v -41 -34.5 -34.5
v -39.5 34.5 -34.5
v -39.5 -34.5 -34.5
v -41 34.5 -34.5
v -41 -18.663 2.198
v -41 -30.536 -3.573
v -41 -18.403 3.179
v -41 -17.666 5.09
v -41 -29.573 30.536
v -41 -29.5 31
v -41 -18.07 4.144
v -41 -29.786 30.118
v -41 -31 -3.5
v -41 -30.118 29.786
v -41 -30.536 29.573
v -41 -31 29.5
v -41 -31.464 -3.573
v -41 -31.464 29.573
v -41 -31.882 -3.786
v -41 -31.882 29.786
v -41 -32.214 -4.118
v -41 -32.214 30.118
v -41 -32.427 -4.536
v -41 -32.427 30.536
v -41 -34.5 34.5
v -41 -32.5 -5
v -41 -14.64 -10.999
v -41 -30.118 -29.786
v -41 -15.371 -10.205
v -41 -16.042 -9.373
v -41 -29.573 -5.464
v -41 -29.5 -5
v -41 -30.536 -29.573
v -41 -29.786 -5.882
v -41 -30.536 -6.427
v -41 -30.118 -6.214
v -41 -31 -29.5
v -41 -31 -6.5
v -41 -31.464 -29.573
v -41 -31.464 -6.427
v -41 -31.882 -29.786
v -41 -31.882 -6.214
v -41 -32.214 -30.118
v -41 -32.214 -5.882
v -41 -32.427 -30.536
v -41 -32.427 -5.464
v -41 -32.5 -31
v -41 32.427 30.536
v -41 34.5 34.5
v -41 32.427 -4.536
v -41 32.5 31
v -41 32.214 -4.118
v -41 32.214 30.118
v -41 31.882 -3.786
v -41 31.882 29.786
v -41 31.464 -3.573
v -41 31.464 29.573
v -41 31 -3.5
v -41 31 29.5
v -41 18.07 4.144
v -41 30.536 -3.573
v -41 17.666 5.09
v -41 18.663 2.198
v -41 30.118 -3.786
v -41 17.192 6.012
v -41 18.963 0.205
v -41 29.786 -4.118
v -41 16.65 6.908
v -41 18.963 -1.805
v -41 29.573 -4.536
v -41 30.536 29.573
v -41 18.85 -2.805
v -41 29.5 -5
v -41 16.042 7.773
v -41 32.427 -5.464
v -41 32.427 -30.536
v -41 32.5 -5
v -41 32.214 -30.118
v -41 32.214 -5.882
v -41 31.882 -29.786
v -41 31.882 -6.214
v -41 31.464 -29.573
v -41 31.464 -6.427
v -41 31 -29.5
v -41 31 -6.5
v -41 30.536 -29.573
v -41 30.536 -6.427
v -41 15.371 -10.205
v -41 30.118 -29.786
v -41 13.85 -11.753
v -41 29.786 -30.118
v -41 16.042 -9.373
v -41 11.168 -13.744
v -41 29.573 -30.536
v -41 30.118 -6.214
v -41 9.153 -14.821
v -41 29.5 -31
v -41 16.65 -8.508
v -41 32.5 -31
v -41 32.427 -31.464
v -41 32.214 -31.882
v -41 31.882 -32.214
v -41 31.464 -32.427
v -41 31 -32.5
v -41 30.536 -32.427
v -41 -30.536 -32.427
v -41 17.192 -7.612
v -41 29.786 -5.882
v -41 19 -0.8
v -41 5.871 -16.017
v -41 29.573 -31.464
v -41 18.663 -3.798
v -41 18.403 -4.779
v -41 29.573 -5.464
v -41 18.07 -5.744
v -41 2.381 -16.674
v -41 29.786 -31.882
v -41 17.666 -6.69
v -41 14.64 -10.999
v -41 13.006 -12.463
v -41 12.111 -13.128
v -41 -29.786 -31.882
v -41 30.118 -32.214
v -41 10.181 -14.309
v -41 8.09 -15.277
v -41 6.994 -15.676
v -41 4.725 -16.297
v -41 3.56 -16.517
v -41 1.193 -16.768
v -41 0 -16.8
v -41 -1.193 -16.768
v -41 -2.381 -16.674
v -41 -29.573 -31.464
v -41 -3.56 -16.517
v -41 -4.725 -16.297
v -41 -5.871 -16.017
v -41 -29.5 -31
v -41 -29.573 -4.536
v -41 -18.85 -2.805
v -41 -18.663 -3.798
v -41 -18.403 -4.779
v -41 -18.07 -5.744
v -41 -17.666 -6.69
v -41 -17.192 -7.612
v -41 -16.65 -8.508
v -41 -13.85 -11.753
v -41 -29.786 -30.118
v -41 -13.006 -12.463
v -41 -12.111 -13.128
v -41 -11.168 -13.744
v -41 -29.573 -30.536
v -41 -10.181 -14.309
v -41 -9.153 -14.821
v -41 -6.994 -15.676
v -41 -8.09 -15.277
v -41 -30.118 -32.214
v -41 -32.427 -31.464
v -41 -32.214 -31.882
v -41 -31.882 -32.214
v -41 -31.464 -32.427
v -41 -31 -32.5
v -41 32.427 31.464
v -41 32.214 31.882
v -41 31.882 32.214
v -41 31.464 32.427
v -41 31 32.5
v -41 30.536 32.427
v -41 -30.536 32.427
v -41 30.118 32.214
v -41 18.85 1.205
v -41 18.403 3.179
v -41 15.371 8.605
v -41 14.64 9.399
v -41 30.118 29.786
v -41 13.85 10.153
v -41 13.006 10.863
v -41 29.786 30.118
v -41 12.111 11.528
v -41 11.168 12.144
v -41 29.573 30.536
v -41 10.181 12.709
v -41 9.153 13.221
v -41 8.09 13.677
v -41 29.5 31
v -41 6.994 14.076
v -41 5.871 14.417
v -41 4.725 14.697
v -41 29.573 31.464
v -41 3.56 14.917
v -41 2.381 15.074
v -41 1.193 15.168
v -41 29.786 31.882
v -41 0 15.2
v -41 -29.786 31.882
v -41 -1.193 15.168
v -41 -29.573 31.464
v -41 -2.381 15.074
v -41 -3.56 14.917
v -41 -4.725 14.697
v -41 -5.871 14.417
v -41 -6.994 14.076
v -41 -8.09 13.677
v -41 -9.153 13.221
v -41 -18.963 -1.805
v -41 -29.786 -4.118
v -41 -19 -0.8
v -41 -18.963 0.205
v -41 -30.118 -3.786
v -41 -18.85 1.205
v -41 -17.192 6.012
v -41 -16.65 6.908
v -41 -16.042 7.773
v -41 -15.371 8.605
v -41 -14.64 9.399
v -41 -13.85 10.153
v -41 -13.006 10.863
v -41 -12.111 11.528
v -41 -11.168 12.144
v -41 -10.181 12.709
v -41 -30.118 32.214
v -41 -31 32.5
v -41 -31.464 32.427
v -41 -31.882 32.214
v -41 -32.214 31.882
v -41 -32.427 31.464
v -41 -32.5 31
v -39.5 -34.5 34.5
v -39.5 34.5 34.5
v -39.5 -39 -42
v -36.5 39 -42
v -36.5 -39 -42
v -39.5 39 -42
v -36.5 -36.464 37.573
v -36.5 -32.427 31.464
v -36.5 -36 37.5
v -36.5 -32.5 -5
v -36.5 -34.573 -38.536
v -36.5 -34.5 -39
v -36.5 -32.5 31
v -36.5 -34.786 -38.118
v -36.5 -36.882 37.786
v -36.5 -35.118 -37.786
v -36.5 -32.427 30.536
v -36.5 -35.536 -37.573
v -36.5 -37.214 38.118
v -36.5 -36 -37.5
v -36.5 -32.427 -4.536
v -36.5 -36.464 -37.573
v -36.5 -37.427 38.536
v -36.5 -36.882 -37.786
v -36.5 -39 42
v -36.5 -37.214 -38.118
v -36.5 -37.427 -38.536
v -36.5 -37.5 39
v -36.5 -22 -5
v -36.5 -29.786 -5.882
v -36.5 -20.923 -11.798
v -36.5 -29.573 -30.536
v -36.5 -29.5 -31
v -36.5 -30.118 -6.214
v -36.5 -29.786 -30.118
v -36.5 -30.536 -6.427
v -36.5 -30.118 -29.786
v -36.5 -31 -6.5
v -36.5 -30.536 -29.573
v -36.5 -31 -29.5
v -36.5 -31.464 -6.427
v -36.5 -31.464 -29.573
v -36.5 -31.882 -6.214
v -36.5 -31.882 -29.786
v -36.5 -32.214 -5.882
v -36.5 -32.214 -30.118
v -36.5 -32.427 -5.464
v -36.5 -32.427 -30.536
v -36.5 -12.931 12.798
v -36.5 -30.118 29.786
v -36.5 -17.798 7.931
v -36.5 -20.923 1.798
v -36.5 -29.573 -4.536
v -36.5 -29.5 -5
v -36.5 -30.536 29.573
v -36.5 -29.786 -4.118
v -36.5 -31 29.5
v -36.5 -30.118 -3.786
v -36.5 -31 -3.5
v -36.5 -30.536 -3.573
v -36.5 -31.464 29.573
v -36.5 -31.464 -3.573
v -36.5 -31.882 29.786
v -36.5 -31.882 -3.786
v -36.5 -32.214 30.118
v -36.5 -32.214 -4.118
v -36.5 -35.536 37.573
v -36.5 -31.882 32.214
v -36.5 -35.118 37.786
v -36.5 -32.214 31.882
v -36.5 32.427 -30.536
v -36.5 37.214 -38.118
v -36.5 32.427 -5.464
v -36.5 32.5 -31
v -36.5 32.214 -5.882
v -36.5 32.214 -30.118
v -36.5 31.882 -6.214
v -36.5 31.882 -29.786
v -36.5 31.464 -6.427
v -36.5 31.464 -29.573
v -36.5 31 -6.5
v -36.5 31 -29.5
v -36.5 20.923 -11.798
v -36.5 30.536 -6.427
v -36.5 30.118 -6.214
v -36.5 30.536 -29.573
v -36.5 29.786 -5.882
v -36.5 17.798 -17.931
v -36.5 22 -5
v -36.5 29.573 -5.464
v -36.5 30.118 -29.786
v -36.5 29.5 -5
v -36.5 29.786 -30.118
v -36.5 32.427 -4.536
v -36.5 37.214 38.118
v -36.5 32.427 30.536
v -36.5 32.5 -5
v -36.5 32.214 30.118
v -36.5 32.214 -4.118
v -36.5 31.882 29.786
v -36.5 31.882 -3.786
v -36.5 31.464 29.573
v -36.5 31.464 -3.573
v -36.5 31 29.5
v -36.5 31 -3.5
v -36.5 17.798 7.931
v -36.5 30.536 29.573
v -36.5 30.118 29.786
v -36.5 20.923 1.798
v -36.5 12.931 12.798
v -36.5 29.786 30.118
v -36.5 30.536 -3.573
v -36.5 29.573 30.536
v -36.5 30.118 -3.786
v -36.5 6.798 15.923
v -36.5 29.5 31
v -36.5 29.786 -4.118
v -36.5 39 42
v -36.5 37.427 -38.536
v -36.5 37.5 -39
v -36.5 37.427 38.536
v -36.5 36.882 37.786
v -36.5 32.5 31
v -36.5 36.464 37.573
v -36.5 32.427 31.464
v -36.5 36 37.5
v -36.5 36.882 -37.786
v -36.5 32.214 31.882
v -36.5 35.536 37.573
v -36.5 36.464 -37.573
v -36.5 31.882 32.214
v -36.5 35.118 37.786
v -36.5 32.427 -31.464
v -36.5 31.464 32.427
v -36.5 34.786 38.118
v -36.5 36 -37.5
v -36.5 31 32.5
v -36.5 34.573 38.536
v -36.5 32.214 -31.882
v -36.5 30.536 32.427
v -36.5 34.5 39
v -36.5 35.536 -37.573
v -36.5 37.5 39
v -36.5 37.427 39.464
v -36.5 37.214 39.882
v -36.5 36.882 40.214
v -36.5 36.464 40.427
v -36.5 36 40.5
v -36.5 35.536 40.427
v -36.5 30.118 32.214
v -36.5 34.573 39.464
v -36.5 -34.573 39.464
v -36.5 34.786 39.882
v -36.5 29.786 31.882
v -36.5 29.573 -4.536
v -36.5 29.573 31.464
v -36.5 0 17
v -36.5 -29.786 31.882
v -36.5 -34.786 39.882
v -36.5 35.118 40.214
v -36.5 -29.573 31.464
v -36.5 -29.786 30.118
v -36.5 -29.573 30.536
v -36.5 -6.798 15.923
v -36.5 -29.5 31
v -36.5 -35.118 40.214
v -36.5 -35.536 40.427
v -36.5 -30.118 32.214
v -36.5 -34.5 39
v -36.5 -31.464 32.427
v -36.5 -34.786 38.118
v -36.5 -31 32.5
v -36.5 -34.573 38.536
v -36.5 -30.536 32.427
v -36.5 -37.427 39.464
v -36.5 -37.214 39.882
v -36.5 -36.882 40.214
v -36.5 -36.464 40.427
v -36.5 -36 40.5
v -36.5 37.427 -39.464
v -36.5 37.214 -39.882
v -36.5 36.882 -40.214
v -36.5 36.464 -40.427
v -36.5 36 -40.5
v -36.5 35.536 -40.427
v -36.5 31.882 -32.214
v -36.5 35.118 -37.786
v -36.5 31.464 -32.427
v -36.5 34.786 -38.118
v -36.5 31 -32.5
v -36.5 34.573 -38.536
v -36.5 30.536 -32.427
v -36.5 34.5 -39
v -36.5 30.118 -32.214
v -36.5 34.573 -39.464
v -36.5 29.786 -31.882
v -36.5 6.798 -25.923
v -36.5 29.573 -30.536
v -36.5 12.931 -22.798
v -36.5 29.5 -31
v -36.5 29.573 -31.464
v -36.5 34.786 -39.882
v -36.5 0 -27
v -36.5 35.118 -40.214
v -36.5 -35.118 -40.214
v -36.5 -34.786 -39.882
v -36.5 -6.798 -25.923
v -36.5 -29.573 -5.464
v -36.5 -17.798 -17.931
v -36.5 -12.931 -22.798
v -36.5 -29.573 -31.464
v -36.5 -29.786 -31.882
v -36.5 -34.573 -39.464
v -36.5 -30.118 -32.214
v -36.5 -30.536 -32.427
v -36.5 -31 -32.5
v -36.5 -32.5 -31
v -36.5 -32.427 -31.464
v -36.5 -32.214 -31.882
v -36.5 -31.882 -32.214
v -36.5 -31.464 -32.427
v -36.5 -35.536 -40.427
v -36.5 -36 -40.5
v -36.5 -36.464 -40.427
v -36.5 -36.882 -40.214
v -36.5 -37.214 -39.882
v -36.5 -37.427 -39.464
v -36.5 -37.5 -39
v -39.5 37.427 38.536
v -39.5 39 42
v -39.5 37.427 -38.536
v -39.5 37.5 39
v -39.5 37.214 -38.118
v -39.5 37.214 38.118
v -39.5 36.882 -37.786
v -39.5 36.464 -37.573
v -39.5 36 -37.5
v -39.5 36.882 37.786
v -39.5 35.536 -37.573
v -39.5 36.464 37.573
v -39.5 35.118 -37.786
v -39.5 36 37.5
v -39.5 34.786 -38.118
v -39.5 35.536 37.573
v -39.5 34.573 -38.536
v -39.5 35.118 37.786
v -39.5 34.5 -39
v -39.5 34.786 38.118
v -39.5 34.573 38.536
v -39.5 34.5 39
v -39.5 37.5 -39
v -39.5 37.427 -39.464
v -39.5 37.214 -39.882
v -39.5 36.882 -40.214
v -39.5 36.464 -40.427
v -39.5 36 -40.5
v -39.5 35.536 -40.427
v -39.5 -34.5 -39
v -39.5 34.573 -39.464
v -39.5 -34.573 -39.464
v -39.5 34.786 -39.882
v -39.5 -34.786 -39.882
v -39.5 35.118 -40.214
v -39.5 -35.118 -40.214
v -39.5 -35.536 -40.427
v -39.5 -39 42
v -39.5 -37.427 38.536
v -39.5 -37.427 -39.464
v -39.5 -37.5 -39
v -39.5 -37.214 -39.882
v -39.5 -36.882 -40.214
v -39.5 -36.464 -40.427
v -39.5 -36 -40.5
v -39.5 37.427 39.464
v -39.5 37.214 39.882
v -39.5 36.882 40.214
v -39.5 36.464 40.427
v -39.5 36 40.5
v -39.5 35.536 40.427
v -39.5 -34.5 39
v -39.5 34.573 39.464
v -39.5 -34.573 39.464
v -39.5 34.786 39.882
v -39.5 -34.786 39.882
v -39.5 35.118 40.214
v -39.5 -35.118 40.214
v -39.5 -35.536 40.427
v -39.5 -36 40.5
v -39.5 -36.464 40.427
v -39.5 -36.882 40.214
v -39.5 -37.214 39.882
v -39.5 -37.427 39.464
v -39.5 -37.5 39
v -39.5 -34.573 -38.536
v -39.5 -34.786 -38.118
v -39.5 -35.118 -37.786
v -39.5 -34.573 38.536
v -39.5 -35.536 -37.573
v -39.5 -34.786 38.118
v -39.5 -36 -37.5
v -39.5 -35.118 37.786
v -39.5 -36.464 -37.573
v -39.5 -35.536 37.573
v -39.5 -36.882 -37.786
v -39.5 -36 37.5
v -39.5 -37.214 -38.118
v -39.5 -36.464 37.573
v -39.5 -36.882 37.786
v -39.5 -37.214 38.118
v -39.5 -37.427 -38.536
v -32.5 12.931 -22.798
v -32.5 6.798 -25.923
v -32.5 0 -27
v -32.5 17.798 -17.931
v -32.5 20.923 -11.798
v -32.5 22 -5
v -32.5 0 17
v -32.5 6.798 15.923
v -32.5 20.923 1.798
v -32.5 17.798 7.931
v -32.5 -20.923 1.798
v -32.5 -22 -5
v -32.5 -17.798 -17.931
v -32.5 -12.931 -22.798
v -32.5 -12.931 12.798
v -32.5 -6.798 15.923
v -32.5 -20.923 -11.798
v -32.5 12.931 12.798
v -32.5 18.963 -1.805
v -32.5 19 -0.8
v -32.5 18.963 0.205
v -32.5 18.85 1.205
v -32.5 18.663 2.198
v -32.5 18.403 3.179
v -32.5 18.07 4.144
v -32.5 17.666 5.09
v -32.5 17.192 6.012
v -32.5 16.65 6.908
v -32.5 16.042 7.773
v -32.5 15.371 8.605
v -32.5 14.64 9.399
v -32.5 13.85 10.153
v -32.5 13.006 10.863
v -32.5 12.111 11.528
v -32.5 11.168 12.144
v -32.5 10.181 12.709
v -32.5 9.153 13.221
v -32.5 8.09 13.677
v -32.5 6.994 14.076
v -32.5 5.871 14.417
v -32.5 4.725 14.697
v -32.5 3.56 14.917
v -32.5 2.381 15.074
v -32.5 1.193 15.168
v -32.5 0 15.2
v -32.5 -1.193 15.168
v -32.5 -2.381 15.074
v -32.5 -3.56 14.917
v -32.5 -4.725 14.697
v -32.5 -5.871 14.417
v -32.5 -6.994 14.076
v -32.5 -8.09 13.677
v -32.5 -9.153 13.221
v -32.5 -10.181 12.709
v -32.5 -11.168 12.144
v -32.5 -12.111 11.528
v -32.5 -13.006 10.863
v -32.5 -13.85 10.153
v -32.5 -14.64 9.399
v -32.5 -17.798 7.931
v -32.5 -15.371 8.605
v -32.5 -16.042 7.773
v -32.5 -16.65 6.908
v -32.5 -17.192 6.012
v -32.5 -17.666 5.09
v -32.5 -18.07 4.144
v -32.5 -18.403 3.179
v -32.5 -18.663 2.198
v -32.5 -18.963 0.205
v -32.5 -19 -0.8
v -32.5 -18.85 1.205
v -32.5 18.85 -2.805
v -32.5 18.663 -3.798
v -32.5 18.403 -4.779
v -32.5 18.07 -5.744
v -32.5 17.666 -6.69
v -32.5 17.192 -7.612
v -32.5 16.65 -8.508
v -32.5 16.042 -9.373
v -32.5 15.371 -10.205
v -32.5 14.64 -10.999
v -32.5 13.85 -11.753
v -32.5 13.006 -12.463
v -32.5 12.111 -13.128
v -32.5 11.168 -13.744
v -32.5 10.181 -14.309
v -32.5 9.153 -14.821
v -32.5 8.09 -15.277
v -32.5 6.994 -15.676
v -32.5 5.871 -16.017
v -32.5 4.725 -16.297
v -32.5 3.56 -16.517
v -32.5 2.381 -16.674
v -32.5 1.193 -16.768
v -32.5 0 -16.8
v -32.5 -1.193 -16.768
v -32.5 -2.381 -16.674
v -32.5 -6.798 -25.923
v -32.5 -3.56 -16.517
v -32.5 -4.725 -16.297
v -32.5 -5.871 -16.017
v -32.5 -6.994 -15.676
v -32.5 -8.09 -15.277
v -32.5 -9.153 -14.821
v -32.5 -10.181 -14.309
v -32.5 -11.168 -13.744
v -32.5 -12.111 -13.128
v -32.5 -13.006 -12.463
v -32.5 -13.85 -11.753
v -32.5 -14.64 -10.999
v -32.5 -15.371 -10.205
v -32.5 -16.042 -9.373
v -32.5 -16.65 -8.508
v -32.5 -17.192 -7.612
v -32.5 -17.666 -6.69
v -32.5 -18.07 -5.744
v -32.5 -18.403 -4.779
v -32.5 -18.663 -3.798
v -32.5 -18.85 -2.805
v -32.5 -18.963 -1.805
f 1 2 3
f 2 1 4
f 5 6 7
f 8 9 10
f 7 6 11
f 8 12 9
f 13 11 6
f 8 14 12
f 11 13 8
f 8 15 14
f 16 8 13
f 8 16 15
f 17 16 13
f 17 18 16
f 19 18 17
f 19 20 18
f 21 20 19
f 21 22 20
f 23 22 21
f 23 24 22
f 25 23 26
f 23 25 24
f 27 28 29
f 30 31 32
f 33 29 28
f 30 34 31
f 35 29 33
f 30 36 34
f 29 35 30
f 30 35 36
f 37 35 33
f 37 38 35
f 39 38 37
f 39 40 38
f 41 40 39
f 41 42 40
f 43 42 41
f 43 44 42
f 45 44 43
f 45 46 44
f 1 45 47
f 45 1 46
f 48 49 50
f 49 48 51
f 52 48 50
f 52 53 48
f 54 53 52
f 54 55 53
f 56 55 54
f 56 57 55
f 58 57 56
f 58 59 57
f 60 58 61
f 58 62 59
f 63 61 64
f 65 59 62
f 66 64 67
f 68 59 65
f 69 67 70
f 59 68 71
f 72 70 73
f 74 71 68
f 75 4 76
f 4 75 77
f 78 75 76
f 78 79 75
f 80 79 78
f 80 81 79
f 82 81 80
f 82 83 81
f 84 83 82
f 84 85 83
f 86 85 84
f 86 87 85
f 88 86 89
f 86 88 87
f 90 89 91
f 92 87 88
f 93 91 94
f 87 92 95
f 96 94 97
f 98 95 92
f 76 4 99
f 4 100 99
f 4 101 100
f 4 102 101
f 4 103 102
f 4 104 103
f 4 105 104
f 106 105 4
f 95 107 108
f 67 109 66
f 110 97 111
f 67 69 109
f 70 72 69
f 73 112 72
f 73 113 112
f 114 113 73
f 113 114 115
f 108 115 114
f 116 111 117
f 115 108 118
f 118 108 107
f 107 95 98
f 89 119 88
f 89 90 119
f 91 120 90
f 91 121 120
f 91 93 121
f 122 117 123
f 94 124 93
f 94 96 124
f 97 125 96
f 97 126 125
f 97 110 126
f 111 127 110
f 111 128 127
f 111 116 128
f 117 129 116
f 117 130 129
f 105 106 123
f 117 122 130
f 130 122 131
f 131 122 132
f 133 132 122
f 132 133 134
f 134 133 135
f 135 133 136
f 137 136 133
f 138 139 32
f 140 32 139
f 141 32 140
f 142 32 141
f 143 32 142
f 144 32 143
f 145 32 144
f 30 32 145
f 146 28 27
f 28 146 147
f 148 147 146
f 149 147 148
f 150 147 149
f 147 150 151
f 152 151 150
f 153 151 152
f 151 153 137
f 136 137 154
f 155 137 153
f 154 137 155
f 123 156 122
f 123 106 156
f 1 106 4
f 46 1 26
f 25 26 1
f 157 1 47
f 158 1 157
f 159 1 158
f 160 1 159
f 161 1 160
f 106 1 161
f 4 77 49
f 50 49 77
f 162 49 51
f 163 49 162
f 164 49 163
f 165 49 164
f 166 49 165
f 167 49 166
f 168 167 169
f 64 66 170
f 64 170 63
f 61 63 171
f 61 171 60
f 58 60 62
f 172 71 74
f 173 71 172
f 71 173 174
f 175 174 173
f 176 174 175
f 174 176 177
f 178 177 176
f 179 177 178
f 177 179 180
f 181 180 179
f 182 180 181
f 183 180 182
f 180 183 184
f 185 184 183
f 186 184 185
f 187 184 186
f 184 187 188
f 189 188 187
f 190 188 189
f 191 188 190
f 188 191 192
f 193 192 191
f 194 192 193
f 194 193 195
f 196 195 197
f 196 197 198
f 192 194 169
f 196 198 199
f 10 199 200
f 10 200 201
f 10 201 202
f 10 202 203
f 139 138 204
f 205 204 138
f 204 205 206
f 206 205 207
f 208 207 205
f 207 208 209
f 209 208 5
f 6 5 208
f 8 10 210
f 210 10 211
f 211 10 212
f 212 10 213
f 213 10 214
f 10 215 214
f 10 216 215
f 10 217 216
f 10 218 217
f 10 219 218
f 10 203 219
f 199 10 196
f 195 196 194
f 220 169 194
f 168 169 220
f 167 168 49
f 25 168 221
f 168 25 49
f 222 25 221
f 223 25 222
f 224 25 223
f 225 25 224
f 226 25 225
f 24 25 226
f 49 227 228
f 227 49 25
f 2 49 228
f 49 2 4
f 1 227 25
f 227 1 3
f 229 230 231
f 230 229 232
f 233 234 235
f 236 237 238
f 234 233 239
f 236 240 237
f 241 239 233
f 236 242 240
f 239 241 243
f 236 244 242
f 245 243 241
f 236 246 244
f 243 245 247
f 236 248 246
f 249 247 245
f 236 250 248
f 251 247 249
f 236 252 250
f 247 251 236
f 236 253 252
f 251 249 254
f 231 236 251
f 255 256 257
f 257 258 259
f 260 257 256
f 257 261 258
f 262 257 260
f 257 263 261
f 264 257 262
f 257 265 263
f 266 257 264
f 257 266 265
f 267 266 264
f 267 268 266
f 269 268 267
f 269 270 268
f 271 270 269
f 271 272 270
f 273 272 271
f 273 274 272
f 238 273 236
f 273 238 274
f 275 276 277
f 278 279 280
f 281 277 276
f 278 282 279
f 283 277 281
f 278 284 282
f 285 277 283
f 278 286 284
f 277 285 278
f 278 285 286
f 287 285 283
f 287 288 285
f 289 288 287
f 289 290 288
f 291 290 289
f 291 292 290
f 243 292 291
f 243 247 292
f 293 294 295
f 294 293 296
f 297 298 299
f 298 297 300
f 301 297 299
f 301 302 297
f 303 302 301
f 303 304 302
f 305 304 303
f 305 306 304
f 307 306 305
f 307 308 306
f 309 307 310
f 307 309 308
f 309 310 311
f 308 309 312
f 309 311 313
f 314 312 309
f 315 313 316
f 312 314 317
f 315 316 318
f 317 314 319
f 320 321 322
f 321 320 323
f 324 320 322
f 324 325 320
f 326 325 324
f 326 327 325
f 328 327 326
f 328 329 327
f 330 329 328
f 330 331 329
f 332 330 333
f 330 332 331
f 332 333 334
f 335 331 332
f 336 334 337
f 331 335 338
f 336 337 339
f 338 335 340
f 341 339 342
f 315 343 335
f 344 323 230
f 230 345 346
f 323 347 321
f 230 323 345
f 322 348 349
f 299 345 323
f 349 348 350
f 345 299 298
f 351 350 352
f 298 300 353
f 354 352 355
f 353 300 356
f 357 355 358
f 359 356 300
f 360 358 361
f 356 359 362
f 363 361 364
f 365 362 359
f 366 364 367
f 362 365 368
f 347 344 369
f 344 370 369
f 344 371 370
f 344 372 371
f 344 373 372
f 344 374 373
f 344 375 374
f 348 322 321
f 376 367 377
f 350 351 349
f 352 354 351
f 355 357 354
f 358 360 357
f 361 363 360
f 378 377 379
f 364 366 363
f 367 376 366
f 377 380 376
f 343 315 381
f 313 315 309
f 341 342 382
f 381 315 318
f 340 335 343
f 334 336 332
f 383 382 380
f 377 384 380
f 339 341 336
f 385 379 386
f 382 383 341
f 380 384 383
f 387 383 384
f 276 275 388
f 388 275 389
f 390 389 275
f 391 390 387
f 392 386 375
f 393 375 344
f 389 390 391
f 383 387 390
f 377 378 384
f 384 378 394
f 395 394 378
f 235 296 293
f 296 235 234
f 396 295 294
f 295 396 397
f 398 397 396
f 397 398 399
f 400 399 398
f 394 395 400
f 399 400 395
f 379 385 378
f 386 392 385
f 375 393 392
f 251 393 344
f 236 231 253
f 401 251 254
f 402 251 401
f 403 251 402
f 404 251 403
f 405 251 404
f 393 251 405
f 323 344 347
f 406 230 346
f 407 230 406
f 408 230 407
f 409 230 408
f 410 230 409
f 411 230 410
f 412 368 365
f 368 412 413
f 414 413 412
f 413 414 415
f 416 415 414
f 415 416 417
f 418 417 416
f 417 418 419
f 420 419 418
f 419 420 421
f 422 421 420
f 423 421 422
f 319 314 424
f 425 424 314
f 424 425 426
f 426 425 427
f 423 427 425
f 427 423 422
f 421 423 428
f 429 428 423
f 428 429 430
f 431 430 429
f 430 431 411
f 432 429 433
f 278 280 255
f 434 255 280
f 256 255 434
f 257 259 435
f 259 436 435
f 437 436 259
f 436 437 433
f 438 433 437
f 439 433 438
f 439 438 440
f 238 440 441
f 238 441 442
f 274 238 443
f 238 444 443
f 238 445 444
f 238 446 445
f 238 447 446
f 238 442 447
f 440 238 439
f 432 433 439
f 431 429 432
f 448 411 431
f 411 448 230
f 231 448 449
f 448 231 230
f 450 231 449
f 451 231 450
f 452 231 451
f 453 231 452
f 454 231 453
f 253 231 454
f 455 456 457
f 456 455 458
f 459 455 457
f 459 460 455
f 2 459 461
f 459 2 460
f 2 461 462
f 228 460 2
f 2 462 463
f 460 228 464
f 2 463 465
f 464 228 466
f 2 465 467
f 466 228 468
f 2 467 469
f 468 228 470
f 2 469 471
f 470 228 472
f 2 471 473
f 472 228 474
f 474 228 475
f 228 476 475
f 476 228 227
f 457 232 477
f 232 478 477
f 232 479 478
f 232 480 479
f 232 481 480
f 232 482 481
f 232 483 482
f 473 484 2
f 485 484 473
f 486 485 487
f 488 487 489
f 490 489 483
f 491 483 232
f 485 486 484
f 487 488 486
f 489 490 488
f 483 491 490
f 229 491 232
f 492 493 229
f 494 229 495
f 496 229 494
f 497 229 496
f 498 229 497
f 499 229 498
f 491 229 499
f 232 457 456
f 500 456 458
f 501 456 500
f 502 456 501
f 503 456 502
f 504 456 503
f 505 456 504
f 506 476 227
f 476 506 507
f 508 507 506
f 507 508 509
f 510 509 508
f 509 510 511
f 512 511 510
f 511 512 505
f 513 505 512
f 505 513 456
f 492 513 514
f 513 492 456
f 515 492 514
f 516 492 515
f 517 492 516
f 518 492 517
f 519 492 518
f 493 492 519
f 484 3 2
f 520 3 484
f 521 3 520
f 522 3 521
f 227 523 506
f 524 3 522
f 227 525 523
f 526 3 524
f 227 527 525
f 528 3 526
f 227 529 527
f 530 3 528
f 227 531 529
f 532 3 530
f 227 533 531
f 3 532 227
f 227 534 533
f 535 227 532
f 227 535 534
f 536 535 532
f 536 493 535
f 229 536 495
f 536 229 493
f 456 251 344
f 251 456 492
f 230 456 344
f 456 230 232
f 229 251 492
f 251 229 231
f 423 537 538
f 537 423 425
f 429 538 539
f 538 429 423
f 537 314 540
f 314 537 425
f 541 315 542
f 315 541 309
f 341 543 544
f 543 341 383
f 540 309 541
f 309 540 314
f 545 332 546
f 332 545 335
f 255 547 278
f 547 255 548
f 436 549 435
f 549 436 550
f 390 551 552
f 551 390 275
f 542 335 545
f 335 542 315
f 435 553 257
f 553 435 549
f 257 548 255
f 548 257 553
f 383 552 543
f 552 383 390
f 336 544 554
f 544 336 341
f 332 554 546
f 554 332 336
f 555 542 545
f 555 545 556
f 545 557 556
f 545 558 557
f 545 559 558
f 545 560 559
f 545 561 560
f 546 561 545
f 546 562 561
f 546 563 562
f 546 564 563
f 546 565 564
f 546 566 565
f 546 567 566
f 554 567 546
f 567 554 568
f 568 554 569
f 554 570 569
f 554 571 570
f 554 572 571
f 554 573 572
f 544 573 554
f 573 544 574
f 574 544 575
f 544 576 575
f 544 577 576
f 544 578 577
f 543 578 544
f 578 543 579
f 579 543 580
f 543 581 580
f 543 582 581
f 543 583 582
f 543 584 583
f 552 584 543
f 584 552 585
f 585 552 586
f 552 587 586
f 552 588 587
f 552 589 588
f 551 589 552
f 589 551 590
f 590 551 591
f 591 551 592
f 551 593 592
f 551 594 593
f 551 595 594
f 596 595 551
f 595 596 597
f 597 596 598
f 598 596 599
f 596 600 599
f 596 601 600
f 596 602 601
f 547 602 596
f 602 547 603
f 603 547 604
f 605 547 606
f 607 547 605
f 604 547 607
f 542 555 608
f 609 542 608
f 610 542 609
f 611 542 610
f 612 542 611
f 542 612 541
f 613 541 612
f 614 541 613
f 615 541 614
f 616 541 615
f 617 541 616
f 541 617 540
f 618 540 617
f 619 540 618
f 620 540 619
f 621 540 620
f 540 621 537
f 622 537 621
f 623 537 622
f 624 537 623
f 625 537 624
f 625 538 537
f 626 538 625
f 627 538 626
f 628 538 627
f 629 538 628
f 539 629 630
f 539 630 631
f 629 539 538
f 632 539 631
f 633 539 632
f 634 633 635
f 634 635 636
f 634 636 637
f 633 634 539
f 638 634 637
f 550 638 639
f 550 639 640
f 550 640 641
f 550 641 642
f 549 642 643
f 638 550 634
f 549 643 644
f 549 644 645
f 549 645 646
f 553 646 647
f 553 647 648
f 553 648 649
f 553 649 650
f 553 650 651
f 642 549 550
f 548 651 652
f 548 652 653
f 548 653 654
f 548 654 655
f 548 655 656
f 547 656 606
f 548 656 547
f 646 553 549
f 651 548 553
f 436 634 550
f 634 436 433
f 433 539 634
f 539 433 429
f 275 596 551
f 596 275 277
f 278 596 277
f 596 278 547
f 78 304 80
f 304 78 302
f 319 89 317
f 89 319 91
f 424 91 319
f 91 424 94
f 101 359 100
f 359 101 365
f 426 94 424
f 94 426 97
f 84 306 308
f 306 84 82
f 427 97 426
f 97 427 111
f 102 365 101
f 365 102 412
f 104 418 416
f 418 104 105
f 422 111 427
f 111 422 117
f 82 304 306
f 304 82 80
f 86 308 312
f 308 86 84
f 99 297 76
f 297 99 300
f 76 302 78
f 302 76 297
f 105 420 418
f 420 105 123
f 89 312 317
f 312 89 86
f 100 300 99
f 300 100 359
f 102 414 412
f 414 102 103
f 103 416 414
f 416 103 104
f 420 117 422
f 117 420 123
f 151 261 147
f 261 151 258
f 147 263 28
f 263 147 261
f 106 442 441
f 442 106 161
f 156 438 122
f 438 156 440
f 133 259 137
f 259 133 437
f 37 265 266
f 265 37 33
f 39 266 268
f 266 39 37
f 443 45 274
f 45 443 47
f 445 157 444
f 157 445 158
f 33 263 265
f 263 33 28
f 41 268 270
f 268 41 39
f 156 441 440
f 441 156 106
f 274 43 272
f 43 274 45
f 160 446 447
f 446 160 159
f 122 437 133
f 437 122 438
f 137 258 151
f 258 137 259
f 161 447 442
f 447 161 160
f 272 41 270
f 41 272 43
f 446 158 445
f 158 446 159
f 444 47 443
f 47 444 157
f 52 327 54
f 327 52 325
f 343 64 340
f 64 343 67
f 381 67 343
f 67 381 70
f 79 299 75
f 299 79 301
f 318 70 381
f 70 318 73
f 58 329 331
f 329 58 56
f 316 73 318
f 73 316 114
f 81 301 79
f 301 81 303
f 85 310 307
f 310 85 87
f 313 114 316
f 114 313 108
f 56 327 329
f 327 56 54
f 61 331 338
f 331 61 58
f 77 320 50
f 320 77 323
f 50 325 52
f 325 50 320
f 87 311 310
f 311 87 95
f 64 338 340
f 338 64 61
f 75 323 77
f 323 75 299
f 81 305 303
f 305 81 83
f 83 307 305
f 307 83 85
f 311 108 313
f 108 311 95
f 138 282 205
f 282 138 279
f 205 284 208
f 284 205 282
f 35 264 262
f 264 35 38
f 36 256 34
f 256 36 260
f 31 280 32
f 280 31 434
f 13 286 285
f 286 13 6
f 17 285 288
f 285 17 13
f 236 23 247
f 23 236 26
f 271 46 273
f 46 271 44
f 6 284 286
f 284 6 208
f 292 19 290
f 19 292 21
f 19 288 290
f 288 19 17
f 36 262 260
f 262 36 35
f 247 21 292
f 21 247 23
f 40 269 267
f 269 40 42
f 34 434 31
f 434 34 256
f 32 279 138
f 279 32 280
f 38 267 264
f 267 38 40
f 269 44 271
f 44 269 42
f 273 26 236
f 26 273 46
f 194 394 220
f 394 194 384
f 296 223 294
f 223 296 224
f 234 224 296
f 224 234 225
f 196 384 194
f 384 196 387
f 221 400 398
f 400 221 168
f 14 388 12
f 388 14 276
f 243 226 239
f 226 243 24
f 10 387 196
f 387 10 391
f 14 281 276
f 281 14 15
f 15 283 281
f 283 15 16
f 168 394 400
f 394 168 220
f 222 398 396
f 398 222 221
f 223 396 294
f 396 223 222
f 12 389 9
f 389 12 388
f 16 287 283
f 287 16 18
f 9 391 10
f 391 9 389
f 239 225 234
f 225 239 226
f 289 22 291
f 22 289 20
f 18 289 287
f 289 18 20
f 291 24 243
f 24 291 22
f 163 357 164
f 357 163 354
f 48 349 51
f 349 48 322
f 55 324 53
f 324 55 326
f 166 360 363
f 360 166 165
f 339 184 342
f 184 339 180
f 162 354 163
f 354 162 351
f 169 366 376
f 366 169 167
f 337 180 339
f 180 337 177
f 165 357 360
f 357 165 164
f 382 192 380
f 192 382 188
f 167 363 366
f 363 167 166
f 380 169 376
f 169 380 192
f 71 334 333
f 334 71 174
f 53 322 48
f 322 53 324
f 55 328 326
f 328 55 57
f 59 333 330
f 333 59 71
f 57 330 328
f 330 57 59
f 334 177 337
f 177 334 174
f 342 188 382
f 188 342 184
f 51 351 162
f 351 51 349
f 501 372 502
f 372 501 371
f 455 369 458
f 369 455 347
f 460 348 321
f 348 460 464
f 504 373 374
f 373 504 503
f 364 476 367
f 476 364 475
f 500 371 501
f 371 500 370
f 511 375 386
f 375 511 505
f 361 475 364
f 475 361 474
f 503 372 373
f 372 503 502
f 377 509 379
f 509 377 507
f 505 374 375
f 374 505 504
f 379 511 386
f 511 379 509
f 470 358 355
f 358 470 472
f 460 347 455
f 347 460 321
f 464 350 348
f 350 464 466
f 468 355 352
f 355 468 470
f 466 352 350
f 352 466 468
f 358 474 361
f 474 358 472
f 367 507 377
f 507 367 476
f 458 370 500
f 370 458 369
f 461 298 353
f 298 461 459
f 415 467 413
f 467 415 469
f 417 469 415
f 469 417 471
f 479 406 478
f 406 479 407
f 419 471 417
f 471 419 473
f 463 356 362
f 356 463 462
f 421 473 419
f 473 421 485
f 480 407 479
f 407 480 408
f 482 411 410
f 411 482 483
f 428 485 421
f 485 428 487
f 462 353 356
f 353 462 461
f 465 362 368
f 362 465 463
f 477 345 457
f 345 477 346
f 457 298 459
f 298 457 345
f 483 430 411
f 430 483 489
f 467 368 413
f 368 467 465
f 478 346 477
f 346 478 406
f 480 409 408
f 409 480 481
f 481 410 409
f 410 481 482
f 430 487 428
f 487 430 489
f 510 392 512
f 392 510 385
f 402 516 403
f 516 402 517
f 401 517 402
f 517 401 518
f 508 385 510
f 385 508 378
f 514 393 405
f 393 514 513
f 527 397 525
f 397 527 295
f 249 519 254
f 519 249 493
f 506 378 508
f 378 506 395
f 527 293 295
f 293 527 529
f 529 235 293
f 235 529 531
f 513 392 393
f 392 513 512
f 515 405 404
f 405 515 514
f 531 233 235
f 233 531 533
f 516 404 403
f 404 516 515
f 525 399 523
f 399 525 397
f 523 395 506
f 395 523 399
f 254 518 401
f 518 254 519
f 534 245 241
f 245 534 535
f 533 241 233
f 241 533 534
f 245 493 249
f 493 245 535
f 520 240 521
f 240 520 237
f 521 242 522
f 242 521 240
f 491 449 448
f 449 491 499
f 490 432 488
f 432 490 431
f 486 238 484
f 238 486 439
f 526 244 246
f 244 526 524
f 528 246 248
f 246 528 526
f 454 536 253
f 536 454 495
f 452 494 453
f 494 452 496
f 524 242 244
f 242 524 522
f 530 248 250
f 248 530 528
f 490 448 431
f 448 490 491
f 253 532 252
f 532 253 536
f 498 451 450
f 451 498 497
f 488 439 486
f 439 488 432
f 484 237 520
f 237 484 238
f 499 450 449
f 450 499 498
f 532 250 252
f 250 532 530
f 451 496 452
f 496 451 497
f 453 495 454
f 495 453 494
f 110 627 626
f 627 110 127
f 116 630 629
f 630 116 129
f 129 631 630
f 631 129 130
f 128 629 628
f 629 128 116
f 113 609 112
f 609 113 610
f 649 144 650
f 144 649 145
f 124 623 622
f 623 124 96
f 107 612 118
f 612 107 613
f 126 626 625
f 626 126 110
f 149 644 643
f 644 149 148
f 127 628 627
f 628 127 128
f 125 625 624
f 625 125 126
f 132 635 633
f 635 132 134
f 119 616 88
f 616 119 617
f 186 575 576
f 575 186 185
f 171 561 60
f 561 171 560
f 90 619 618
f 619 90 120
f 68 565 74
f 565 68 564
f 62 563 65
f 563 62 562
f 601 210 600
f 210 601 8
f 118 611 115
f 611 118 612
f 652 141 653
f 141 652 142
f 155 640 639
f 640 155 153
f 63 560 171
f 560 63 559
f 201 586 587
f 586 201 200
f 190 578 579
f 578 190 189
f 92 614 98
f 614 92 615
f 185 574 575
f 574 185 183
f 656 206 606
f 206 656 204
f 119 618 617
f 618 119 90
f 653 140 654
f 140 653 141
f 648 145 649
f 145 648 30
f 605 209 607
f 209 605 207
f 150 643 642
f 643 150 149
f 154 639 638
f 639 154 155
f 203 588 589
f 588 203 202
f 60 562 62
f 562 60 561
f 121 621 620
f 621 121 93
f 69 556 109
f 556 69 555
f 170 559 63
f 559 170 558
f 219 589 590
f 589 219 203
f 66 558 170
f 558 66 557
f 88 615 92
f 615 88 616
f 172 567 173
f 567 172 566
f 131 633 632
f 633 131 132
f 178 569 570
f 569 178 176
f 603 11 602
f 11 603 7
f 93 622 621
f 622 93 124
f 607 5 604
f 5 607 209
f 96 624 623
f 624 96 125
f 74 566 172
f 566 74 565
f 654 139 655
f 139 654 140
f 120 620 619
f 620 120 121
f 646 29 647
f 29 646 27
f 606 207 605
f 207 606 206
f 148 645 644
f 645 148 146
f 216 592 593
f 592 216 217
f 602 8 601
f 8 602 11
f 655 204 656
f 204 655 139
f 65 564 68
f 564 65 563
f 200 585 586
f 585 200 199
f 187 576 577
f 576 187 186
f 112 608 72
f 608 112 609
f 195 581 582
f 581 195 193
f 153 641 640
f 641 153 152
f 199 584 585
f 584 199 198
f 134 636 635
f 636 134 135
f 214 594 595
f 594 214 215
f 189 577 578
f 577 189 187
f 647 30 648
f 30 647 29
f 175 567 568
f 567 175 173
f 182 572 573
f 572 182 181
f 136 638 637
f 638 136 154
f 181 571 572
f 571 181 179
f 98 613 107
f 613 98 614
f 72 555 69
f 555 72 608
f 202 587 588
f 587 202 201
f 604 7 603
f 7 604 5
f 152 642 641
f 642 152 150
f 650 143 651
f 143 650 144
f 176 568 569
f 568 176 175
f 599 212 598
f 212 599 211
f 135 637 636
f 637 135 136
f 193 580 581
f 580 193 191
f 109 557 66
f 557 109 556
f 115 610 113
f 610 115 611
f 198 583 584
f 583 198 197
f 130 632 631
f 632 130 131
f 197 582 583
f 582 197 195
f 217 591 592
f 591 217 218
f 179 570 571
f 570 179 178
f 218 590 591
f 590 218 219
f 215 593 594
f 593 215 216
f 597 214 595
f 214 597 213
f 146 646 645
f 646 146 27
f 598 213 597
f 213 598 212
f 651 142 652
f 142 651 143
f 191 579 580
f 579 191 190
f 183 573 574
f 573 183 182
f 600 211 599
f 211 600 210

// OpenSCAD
$fn=20;

module screw(){
	translate([-30,0,0])rotate([0,90,0]) cylinder(r=1.50, h=35,center=true);
}

module screwset(){
	dist=31;
  	translate([0,dist,dist])screw();
    translate([0,-dist,dist])screw();
	translate([0,dist,0])screw();
	translate([0,-dist,0])screw();
  	translate([0,-dist,-dist])screw();
  	translate([0,dist,-dist])screw();

}


module screwset_frontpanel(){
	dist=31;
  	translate([0,dist,dist])screw();
        translate([0,-dist,dist])screw();
	translate([0,dist,5])screw();
	translate([0,-dist,5])screw();
  	translate([0,-dist,-dist])screw();
  	translate([0,dist,-dist])screw();
    translate([0,36,-39])screw();
    translate([0,36,39])screw();
    translate([0,-36,-39])screw();
    translate([0,-36,39])screw();

}


dia=23; // of the antenna

module antenna_cover(){
	difference(){
		union(){
			cylinder(r=dia+4,h=6,center=true);
			cube([6,dia*2+22,6],center=true);
		}
		translate([0,0,-1])cylinder(r=dia+2,h=5,center=true);
		cylinder(r=dia-2,h=7,center=true);
		translate([0,0,30])rotate([0,-90,0])screwset();
        translate([5,0,-2])cube([2,80,2],center=true);
	}
}

module rfid_board_hook(){
	distance=25;
    stickout=36;
    x=23;
	translate([x,stickout,distance]) cube([3,4,4],center=true);
	translate([x,stickout,-distance]) cube([3,4,4],center=true);
	translate([x,-stickout,distance]) cube([3,4,5],center=true);
	translate([x,-stickout,-distance]) cube([3,4,5],center=true);
}


module cboard_cover(){
//	translate([5,0,0])
        difference(){
		union(){
			translate([15,43,0])cube([30,12,63],center=true);
			translate([15,37,0])cube([30,4,70],center=true);
		}
		translate([15,40,0])cube([26,10,58],center=true);
		translate([18,38,0])cube([26,7,10],center=true);
		translate([15,35,0])cboard_screw(dia=2);
	}
}

module spoutholder(){
    rfid_board_hook();
	difference(){
        union(){
            cube([60,70,70],center=true); //outside
            translate([13,0,28])rotate([0,35,0])cube([20,30,30],center=true); // plate for spout
        }
		translate([-14,0,0])screwset();
		translate([-14,0,0])rotate([0,90,0])cylinder(r=dia-3,h=35,center=true);//rfid ring
		translate([-20,0,0])cube([55,60,56],center=true); //front chamber
		translate([20.1,0,-15])cube([20,50,80],center=true); //back chamber
		translate([-25,0,0])cube([10,80,56],center=true);//side slot
		translate([-12,11,-29])rotate([4,0,0])cube([40,27,6.2],center=true);//bottom
		translate([-12,-11,-29])rotate([-4,0,0])cube([40,27,6.2],center=true);//bottom
	        translate([-14,0,5])rotate([0,0,90])union(){  // spout assembly
		translate([0,-10,0]) rotate([0,90,0]) cylinder(r=2.5, h=75,center=true); //holes for alignment of the spout tip 			
		translate([0,-10,0]) rotate([35,0,0]) cylinder(r=4.6, h=55); // location of the spout 
		translate([0,-42,31]) rotate([-55, 0,0]) cube([8.4, 18, 4.1], center=true);// hex screw for spout 
		translate([0,-60,14]) rotate([-55,0,0]) cylinder(r=1.9, h=50); //screw hole for tightening the spout 
		translate([0,-10,-60]) cylinder(r=5, h=40); //hole for collection tube //yes
		}
		translate([15,35,0])cboard_screw();
		translate([0,0,30])cylinder(r=2.8,h=20,center=true);//cue light
		translate([-8,0,30])cylinder(r=2.8,h=20,center=true);//cue light
	}
}

module cboard_screw(dia=1.5){
	distance=32;
	translate([0,0,distance])rotate([90,0,0]) cylinder(r=dia, h=350,center=true);
	translate([0,0,-distance])rotate([90,0,0]) cylinder(r=dia, h=350,center=true);
	translate([0,19,-distance])rotate([90,0,0]) cylinder(r=dia+3, h=30,center=true); // screw head
	translate([0,19,distance])rotate([90,0,0]) cylinder(r=dia+3, h=30,center=true); // screw head
}

module frontpanel(){
    difference(){
        union(){
            cube([69,69,2],center=true);
            translate([0,0,2])cube([84,78,3],center=true);
            translate([5,0,5])cylinder(r=dia-1,h=5,center=true);
        }
    	scale([.8,.95,1])translate([1,0,4])cylinder(r=dia-3,h=14,center=true,$fn=100);
        translate([0,0,-20])rotate([0,90,0])screwset_frontpanel();
    }
}


translate([-40,0,0])rotate([0,90,0])frontpanel();
//color("red")translate([-35,0,-5])rotate([0,90,0])antenna_cover();
//spoutholder();
//color("blue")cboard_cover();
